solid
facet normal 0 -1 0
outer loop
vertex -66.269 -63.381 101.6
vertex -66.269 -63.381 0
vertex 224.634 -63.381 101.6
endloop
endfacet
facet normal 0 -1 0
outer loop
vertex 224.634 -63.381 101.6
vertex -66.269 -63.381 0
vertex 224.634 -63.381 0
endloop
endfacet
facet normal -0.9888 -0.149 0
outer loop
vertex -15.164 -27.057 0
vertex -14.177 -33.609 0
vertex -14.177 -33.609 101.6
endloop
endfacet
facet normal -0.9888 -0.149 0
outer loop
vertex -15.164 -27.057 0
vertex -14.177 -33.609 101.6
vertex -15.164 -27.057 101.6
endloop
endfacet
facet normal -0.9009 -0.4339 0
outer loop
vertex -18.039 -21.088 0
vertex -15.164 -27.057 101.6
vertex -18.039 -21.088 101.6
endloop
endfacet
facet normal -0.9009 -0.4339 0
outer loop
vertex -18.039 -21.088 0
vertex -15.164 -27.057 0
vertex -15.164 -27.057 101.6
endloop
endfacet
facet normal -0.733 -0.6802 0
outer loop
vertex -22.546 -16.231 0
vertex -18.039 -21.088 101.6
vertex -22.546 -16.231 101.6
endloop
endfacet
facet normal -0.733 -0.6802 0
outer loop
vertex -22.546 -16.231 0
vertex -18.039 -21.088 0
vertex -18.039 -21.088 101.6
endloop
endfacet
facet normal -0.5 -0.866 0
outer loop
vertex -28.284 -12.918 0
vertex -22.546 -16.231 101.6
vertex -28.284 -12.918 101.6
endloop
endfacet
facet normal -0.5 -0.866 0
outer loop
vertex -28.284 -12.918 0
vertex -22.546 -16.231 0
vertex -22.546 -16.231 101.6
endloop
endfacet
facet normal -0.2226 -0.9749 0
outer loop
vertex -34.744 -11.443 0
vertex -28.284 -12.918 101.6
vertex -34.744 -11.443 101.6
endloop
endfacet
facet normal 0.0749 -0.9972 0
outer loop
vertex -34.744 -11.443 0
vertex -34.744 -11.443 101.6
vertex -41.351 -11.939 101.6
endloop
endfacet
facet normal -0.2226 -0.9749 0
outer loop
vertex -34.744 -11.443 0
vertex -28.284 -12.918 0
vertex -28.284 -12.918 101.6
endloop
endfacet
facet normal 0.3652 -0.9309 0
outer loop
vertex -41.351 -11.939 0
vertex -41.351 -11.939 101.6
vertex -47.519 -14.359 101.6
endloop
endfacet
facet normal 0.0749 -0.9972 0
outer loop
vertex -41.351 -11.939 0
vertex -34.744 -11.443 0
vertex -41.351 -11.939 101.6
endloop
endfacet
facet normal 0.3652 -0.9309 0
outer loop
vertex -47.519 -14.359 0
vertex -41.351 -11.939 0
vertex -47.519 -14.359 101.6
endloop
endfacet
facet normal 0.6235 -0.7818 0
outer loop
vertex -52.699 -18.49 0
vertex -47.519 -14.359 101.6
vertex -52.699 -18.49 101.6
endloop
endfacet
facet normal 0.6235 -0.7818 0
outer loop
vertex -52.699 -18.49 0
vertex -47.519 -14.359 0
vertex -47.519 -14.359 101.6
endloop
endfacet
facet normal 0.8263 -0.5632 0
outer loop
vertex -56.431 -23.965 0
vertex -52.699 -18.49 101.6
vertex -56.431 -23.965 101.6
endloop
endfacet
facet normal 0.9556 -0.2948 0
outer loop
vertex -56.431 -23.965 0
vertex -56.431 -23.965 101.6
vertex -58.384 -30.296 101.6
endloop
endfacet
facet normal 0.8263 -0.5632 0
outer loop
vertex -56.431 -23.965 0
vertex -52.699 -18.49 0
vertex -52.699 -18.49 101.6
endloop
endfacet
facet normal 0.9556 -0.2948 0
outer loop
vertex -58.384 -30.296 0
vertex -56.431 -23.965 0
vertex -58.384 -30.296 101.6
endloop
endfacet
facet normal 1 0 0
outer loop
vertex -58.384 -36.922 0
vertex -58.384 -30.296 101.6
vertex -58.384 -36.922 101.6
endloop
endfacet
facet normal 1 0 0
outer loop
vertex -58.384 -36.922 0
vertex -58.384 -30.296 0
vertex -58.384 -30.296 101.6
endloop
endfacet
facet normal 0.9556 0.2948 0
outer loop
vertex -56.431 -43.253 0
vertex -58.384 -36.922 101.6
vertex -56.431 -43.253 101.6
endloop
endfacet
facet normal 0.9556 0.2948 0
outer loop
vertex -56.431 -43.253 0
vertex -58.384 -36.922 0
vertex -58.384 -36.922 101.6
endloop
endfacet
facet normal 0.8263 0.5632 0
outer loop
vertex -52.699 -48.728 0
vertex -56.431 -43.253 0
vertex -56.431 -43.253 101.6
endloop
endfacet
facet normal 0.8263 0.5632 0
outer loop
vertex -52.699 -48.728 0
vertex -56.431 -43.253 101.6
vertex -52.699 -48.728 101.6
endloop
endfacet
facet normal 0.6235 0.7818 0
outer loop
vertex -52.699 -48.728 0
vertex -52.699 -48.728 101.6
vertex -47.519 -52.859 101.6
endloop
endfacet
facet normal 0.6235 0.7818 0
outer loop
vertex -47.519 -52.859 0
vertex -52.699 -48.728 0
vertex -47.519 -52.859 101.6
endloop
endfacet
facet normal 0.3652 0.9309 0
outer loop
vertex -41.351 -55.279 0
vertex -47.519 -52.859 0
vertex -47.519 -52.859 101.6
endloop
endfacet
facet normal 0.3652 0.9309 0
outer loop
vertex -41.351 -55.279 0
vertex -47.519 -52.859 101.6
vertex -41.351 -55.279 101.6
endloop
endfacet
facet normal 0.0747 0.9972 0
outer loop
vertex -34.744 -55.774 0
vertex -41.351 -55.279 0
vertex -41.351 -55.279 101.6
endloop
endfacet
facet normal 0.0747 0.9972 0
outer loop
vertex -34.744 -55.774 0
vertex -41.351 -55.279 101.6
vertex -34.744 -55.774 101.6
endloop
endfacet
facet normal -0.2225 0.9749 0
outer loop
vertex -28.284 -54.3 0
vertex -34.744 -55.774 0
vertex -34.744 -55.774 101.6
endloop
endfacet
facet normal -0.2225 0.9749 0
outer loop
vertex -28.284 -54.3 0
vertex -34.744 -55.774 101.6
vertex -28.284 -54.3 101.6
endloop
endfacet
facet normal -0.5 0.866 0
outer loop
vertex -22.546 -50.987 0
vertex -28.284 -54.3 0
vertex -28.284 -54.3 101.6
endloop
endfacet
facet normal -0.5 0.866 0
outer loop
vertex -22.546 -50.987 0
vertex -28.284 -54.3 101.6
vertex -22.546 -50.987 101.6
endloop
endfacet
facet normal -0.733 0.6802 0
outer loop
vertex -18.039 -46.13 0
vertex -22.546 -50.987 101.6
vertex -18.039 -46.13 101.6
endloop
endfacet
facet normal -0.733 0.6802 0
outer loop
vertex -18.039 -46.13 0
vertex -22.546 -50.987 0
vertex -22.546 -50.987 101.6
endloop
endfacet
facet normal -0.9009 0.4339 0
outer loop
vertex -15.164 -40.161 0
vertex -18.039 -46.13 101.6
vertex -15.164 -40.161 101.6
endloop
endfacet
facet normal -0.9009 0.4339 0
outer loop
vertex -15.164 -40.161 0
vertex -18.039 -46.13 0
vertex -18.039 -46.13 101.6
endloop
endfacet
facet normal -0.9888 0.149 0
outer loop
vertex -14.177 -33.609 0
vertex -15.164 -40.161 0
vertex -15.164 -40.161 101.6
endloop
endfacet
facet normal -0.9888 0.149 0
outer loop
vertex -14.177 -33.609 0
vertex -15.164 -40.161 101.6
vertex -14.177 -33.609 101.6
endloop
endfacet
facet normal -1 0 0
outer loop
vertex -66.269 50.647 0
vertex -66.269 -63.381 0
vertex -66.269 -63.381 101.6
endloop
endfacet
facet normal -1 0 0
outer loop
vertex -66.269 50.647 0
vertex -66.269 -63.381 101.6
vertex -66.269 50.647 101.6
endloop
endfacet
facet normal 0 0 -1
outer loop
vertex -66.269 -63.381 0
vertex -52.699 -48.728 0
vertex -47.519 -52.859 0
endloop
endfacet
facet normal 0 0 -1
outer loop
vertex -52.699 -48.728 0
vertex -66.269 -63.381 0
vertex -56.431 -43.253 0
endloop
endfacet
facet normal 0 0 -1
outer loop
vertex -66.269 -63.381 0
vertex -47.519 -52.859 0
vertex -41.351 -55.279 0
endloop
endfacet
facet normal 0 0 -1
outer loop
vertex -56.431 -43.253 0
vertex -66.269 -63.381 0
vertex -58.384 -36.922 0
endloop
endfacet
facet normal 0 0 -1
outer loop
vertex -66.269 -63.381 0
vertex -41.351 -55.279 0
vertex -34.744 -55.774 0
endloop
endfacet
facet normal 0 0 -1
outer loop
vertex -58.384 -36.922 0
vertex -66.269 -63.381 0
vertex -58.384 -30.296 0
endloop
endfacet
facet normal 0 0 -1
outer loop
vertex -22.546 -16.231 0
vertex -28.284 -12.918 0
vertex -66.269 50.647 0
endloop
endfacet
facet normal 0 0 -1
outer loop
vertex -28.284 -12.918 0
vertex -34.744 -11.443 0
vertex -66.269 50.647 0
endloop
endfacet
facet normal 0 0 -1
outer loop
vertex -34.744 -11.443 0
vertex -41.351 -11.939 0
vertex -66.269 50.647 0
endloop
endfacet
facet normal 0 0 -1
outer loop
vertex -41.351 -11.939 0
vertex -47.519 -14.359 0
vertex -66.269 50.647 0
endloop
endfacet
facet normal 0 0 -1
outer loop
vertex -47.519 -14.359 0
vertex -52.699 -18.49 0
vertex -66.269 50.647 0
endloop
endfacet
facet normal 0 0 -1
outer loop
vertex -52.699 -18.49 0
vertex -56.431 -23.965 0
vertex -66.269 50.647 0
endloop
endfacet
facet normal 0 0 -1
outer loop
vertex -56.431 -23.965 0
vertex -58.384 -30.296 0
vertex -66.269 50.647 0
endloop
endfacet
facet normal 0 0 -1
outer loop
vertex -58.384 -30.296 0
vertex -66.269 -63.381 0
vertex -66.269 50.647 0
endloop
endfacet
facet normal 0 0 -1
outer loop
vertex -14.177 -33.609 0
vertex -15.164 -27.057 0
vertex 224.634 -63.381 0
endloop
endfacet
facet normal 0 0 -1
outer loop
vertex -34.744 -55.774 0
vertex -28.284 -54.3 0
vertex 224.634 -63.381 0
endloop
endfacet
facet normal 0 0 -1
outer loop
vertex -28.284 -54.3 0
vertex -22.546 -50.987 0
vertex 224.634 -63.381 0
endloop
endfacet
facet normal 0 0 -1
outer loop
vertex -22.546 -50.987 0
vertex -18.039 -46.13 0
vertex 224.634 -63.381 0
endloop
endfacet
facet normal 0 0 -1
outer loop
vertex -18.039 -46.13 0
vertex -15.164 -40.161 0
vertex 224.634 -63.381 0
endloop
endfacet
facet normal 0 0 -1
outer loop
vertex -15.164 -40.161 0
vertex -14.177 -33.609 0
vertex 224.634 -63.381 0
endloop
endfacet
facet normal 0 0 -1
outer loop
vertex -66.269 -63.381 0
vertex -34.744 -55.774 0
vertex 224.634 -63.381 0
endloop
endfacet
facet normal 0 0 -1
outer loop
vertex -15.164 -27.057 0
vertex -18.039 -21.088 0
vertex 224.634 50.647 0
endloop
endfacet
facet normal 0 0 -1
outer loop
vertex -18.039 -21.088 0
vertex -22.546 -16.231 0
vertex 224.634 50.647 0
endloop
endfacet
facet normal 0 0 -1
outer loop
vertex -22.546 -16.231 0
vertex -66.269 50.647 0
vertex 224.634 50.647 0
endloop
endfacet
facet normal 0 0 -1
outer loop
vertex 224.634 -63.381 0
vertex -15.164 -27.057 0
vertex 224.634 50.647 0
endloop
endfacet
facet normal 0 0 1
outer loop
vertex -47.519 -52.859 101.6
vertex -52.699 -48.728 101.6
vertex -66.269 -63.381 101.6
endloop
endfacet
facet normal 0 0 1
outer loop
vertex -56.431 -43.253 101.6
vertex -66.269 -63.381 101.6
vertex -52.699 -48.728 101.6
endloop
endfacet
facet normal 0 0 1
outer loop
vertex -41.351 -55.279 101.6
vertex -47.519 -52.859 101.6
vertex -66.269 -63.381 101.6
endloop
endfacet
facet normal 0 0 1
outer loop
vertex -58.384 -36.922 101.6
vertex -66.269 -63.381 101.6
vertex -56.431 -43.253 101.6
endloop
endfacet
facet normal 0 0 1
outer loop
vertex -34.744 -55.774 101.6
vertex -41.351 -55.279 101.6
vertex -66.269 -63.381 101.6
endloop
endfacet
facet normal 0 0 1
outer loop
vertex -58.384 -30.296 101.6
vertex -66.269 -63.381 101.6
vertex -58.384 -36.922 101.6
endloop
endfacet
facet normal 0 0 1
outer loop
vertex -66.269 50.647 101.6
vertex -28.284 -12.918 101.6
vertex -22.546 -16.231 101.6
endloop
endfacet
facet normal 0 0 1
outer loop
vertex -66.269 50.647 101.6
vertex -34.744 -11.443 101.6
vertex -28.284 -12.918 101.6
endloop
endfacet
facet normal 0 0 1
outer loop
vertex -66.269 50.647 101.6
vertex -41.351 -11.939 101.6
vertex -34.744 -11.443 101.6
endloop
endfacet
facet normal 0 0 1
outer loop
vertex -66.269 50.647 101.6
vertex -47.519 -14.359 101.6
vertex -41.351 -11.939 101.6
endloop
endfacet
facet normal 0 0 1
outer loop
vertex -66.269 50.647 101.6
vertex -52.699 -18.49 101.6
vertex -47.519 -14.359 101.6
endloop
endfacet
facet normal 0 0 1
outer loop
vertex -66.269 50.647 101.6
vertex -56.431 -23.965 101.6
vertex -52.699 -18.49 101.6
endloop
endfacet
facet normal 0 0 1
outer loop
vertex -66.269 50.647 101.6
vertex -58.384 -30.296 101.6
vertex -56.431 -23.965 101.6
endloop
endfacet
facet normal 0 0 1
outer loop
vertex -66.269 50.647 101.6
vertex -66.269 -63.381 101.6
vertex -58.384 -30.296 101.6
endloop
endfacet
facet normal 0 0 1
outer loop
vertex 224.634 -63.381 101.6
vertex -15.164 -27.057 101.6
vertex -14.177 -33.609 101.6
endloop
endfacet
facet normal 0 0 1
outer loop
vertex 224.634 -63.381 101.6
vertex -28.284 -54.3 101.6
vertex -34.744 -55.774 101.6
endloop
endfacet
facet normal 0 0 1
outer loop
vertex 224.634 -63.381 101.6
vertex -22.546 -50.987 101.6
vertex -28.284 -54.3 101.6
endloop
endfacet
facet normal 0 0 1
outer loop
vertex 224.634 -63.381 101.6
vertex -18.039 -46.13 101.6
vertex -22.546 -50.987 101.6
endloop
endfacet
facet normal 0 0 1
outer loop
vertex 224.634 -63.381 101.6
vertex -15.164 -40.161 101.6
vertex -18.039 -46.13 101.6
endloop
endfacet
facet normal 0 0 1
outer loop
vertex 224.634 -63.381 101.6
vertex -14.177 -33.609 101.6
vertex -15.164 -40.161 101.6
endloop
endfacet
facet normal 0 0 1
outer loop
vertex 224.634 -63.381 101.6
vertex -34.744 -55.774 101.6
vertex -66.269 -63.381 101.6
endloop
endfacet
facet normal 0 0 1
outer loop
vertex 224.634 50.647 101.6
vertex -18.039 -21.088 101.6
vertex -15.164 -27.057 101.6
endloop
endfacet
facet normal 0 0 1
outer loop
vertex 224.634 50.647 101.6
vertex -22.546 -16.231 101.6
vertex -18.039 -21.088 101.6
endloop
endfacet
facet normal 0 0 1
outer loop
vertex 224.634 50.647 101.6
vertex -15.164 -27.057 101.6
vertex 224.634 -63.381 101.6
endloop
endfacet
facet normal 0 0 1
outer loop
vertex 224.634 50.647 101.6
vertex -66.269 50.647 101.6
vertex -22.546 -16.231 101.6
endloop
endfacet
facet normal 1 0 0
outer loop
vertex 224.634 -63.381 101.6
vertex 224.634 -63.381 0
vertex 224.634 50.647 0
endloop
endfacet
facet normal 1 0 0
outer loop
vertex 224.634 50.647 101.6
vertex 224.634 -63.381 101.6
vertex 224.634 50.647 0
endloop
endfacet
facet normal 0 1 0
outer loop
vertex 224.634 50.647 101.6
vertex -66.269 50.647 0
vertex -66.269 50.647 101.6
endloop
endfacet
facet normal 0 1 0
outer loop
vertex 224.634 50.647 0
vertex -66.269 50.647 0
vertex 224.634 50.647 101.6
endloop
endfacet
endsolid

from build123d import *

# Parameters (mm, degrees)
F0_W     = 290.903047
F0_H     = 114.028264
F0_R     = 22.227707
F1_DEPTH = 101.6
F3_DEPTH = 25.4


with BuildPart() as f1:
    # F0 (on Top) → F1 (new body)
    with BuildSketch(Plane.XY):
        with Locations((79.182141, -6.367212)):
            Rectangle(F0_W, F0_H)
        with Locations((-36.404692, -33.608936)):
            Circle(F0_R, mode=Mode.SUBTRACT)
    extrude(amount=F1_DEPTH)

    # F2 (on face) → F3 (cut)
    with BuildSketch(Plane.XY.offset(101.6)):
        with BuildLine():
            Line((113.667183, 17.614277), (90.719864, 17.614277))
            Line((90.719864, 17.614277), (90.719864, 3.507722))
            ThreePointArc((90.719864, 3.507722), (96.879223, -42.829117), (113.667183, 0.796618))
            Line((113.667183, 0.796618), (113.667183, 17.614277))
        make_face()
    extrude(amount=F3_DEPTH, mode=Mode.SUBTRACT)


solid = f1.part
